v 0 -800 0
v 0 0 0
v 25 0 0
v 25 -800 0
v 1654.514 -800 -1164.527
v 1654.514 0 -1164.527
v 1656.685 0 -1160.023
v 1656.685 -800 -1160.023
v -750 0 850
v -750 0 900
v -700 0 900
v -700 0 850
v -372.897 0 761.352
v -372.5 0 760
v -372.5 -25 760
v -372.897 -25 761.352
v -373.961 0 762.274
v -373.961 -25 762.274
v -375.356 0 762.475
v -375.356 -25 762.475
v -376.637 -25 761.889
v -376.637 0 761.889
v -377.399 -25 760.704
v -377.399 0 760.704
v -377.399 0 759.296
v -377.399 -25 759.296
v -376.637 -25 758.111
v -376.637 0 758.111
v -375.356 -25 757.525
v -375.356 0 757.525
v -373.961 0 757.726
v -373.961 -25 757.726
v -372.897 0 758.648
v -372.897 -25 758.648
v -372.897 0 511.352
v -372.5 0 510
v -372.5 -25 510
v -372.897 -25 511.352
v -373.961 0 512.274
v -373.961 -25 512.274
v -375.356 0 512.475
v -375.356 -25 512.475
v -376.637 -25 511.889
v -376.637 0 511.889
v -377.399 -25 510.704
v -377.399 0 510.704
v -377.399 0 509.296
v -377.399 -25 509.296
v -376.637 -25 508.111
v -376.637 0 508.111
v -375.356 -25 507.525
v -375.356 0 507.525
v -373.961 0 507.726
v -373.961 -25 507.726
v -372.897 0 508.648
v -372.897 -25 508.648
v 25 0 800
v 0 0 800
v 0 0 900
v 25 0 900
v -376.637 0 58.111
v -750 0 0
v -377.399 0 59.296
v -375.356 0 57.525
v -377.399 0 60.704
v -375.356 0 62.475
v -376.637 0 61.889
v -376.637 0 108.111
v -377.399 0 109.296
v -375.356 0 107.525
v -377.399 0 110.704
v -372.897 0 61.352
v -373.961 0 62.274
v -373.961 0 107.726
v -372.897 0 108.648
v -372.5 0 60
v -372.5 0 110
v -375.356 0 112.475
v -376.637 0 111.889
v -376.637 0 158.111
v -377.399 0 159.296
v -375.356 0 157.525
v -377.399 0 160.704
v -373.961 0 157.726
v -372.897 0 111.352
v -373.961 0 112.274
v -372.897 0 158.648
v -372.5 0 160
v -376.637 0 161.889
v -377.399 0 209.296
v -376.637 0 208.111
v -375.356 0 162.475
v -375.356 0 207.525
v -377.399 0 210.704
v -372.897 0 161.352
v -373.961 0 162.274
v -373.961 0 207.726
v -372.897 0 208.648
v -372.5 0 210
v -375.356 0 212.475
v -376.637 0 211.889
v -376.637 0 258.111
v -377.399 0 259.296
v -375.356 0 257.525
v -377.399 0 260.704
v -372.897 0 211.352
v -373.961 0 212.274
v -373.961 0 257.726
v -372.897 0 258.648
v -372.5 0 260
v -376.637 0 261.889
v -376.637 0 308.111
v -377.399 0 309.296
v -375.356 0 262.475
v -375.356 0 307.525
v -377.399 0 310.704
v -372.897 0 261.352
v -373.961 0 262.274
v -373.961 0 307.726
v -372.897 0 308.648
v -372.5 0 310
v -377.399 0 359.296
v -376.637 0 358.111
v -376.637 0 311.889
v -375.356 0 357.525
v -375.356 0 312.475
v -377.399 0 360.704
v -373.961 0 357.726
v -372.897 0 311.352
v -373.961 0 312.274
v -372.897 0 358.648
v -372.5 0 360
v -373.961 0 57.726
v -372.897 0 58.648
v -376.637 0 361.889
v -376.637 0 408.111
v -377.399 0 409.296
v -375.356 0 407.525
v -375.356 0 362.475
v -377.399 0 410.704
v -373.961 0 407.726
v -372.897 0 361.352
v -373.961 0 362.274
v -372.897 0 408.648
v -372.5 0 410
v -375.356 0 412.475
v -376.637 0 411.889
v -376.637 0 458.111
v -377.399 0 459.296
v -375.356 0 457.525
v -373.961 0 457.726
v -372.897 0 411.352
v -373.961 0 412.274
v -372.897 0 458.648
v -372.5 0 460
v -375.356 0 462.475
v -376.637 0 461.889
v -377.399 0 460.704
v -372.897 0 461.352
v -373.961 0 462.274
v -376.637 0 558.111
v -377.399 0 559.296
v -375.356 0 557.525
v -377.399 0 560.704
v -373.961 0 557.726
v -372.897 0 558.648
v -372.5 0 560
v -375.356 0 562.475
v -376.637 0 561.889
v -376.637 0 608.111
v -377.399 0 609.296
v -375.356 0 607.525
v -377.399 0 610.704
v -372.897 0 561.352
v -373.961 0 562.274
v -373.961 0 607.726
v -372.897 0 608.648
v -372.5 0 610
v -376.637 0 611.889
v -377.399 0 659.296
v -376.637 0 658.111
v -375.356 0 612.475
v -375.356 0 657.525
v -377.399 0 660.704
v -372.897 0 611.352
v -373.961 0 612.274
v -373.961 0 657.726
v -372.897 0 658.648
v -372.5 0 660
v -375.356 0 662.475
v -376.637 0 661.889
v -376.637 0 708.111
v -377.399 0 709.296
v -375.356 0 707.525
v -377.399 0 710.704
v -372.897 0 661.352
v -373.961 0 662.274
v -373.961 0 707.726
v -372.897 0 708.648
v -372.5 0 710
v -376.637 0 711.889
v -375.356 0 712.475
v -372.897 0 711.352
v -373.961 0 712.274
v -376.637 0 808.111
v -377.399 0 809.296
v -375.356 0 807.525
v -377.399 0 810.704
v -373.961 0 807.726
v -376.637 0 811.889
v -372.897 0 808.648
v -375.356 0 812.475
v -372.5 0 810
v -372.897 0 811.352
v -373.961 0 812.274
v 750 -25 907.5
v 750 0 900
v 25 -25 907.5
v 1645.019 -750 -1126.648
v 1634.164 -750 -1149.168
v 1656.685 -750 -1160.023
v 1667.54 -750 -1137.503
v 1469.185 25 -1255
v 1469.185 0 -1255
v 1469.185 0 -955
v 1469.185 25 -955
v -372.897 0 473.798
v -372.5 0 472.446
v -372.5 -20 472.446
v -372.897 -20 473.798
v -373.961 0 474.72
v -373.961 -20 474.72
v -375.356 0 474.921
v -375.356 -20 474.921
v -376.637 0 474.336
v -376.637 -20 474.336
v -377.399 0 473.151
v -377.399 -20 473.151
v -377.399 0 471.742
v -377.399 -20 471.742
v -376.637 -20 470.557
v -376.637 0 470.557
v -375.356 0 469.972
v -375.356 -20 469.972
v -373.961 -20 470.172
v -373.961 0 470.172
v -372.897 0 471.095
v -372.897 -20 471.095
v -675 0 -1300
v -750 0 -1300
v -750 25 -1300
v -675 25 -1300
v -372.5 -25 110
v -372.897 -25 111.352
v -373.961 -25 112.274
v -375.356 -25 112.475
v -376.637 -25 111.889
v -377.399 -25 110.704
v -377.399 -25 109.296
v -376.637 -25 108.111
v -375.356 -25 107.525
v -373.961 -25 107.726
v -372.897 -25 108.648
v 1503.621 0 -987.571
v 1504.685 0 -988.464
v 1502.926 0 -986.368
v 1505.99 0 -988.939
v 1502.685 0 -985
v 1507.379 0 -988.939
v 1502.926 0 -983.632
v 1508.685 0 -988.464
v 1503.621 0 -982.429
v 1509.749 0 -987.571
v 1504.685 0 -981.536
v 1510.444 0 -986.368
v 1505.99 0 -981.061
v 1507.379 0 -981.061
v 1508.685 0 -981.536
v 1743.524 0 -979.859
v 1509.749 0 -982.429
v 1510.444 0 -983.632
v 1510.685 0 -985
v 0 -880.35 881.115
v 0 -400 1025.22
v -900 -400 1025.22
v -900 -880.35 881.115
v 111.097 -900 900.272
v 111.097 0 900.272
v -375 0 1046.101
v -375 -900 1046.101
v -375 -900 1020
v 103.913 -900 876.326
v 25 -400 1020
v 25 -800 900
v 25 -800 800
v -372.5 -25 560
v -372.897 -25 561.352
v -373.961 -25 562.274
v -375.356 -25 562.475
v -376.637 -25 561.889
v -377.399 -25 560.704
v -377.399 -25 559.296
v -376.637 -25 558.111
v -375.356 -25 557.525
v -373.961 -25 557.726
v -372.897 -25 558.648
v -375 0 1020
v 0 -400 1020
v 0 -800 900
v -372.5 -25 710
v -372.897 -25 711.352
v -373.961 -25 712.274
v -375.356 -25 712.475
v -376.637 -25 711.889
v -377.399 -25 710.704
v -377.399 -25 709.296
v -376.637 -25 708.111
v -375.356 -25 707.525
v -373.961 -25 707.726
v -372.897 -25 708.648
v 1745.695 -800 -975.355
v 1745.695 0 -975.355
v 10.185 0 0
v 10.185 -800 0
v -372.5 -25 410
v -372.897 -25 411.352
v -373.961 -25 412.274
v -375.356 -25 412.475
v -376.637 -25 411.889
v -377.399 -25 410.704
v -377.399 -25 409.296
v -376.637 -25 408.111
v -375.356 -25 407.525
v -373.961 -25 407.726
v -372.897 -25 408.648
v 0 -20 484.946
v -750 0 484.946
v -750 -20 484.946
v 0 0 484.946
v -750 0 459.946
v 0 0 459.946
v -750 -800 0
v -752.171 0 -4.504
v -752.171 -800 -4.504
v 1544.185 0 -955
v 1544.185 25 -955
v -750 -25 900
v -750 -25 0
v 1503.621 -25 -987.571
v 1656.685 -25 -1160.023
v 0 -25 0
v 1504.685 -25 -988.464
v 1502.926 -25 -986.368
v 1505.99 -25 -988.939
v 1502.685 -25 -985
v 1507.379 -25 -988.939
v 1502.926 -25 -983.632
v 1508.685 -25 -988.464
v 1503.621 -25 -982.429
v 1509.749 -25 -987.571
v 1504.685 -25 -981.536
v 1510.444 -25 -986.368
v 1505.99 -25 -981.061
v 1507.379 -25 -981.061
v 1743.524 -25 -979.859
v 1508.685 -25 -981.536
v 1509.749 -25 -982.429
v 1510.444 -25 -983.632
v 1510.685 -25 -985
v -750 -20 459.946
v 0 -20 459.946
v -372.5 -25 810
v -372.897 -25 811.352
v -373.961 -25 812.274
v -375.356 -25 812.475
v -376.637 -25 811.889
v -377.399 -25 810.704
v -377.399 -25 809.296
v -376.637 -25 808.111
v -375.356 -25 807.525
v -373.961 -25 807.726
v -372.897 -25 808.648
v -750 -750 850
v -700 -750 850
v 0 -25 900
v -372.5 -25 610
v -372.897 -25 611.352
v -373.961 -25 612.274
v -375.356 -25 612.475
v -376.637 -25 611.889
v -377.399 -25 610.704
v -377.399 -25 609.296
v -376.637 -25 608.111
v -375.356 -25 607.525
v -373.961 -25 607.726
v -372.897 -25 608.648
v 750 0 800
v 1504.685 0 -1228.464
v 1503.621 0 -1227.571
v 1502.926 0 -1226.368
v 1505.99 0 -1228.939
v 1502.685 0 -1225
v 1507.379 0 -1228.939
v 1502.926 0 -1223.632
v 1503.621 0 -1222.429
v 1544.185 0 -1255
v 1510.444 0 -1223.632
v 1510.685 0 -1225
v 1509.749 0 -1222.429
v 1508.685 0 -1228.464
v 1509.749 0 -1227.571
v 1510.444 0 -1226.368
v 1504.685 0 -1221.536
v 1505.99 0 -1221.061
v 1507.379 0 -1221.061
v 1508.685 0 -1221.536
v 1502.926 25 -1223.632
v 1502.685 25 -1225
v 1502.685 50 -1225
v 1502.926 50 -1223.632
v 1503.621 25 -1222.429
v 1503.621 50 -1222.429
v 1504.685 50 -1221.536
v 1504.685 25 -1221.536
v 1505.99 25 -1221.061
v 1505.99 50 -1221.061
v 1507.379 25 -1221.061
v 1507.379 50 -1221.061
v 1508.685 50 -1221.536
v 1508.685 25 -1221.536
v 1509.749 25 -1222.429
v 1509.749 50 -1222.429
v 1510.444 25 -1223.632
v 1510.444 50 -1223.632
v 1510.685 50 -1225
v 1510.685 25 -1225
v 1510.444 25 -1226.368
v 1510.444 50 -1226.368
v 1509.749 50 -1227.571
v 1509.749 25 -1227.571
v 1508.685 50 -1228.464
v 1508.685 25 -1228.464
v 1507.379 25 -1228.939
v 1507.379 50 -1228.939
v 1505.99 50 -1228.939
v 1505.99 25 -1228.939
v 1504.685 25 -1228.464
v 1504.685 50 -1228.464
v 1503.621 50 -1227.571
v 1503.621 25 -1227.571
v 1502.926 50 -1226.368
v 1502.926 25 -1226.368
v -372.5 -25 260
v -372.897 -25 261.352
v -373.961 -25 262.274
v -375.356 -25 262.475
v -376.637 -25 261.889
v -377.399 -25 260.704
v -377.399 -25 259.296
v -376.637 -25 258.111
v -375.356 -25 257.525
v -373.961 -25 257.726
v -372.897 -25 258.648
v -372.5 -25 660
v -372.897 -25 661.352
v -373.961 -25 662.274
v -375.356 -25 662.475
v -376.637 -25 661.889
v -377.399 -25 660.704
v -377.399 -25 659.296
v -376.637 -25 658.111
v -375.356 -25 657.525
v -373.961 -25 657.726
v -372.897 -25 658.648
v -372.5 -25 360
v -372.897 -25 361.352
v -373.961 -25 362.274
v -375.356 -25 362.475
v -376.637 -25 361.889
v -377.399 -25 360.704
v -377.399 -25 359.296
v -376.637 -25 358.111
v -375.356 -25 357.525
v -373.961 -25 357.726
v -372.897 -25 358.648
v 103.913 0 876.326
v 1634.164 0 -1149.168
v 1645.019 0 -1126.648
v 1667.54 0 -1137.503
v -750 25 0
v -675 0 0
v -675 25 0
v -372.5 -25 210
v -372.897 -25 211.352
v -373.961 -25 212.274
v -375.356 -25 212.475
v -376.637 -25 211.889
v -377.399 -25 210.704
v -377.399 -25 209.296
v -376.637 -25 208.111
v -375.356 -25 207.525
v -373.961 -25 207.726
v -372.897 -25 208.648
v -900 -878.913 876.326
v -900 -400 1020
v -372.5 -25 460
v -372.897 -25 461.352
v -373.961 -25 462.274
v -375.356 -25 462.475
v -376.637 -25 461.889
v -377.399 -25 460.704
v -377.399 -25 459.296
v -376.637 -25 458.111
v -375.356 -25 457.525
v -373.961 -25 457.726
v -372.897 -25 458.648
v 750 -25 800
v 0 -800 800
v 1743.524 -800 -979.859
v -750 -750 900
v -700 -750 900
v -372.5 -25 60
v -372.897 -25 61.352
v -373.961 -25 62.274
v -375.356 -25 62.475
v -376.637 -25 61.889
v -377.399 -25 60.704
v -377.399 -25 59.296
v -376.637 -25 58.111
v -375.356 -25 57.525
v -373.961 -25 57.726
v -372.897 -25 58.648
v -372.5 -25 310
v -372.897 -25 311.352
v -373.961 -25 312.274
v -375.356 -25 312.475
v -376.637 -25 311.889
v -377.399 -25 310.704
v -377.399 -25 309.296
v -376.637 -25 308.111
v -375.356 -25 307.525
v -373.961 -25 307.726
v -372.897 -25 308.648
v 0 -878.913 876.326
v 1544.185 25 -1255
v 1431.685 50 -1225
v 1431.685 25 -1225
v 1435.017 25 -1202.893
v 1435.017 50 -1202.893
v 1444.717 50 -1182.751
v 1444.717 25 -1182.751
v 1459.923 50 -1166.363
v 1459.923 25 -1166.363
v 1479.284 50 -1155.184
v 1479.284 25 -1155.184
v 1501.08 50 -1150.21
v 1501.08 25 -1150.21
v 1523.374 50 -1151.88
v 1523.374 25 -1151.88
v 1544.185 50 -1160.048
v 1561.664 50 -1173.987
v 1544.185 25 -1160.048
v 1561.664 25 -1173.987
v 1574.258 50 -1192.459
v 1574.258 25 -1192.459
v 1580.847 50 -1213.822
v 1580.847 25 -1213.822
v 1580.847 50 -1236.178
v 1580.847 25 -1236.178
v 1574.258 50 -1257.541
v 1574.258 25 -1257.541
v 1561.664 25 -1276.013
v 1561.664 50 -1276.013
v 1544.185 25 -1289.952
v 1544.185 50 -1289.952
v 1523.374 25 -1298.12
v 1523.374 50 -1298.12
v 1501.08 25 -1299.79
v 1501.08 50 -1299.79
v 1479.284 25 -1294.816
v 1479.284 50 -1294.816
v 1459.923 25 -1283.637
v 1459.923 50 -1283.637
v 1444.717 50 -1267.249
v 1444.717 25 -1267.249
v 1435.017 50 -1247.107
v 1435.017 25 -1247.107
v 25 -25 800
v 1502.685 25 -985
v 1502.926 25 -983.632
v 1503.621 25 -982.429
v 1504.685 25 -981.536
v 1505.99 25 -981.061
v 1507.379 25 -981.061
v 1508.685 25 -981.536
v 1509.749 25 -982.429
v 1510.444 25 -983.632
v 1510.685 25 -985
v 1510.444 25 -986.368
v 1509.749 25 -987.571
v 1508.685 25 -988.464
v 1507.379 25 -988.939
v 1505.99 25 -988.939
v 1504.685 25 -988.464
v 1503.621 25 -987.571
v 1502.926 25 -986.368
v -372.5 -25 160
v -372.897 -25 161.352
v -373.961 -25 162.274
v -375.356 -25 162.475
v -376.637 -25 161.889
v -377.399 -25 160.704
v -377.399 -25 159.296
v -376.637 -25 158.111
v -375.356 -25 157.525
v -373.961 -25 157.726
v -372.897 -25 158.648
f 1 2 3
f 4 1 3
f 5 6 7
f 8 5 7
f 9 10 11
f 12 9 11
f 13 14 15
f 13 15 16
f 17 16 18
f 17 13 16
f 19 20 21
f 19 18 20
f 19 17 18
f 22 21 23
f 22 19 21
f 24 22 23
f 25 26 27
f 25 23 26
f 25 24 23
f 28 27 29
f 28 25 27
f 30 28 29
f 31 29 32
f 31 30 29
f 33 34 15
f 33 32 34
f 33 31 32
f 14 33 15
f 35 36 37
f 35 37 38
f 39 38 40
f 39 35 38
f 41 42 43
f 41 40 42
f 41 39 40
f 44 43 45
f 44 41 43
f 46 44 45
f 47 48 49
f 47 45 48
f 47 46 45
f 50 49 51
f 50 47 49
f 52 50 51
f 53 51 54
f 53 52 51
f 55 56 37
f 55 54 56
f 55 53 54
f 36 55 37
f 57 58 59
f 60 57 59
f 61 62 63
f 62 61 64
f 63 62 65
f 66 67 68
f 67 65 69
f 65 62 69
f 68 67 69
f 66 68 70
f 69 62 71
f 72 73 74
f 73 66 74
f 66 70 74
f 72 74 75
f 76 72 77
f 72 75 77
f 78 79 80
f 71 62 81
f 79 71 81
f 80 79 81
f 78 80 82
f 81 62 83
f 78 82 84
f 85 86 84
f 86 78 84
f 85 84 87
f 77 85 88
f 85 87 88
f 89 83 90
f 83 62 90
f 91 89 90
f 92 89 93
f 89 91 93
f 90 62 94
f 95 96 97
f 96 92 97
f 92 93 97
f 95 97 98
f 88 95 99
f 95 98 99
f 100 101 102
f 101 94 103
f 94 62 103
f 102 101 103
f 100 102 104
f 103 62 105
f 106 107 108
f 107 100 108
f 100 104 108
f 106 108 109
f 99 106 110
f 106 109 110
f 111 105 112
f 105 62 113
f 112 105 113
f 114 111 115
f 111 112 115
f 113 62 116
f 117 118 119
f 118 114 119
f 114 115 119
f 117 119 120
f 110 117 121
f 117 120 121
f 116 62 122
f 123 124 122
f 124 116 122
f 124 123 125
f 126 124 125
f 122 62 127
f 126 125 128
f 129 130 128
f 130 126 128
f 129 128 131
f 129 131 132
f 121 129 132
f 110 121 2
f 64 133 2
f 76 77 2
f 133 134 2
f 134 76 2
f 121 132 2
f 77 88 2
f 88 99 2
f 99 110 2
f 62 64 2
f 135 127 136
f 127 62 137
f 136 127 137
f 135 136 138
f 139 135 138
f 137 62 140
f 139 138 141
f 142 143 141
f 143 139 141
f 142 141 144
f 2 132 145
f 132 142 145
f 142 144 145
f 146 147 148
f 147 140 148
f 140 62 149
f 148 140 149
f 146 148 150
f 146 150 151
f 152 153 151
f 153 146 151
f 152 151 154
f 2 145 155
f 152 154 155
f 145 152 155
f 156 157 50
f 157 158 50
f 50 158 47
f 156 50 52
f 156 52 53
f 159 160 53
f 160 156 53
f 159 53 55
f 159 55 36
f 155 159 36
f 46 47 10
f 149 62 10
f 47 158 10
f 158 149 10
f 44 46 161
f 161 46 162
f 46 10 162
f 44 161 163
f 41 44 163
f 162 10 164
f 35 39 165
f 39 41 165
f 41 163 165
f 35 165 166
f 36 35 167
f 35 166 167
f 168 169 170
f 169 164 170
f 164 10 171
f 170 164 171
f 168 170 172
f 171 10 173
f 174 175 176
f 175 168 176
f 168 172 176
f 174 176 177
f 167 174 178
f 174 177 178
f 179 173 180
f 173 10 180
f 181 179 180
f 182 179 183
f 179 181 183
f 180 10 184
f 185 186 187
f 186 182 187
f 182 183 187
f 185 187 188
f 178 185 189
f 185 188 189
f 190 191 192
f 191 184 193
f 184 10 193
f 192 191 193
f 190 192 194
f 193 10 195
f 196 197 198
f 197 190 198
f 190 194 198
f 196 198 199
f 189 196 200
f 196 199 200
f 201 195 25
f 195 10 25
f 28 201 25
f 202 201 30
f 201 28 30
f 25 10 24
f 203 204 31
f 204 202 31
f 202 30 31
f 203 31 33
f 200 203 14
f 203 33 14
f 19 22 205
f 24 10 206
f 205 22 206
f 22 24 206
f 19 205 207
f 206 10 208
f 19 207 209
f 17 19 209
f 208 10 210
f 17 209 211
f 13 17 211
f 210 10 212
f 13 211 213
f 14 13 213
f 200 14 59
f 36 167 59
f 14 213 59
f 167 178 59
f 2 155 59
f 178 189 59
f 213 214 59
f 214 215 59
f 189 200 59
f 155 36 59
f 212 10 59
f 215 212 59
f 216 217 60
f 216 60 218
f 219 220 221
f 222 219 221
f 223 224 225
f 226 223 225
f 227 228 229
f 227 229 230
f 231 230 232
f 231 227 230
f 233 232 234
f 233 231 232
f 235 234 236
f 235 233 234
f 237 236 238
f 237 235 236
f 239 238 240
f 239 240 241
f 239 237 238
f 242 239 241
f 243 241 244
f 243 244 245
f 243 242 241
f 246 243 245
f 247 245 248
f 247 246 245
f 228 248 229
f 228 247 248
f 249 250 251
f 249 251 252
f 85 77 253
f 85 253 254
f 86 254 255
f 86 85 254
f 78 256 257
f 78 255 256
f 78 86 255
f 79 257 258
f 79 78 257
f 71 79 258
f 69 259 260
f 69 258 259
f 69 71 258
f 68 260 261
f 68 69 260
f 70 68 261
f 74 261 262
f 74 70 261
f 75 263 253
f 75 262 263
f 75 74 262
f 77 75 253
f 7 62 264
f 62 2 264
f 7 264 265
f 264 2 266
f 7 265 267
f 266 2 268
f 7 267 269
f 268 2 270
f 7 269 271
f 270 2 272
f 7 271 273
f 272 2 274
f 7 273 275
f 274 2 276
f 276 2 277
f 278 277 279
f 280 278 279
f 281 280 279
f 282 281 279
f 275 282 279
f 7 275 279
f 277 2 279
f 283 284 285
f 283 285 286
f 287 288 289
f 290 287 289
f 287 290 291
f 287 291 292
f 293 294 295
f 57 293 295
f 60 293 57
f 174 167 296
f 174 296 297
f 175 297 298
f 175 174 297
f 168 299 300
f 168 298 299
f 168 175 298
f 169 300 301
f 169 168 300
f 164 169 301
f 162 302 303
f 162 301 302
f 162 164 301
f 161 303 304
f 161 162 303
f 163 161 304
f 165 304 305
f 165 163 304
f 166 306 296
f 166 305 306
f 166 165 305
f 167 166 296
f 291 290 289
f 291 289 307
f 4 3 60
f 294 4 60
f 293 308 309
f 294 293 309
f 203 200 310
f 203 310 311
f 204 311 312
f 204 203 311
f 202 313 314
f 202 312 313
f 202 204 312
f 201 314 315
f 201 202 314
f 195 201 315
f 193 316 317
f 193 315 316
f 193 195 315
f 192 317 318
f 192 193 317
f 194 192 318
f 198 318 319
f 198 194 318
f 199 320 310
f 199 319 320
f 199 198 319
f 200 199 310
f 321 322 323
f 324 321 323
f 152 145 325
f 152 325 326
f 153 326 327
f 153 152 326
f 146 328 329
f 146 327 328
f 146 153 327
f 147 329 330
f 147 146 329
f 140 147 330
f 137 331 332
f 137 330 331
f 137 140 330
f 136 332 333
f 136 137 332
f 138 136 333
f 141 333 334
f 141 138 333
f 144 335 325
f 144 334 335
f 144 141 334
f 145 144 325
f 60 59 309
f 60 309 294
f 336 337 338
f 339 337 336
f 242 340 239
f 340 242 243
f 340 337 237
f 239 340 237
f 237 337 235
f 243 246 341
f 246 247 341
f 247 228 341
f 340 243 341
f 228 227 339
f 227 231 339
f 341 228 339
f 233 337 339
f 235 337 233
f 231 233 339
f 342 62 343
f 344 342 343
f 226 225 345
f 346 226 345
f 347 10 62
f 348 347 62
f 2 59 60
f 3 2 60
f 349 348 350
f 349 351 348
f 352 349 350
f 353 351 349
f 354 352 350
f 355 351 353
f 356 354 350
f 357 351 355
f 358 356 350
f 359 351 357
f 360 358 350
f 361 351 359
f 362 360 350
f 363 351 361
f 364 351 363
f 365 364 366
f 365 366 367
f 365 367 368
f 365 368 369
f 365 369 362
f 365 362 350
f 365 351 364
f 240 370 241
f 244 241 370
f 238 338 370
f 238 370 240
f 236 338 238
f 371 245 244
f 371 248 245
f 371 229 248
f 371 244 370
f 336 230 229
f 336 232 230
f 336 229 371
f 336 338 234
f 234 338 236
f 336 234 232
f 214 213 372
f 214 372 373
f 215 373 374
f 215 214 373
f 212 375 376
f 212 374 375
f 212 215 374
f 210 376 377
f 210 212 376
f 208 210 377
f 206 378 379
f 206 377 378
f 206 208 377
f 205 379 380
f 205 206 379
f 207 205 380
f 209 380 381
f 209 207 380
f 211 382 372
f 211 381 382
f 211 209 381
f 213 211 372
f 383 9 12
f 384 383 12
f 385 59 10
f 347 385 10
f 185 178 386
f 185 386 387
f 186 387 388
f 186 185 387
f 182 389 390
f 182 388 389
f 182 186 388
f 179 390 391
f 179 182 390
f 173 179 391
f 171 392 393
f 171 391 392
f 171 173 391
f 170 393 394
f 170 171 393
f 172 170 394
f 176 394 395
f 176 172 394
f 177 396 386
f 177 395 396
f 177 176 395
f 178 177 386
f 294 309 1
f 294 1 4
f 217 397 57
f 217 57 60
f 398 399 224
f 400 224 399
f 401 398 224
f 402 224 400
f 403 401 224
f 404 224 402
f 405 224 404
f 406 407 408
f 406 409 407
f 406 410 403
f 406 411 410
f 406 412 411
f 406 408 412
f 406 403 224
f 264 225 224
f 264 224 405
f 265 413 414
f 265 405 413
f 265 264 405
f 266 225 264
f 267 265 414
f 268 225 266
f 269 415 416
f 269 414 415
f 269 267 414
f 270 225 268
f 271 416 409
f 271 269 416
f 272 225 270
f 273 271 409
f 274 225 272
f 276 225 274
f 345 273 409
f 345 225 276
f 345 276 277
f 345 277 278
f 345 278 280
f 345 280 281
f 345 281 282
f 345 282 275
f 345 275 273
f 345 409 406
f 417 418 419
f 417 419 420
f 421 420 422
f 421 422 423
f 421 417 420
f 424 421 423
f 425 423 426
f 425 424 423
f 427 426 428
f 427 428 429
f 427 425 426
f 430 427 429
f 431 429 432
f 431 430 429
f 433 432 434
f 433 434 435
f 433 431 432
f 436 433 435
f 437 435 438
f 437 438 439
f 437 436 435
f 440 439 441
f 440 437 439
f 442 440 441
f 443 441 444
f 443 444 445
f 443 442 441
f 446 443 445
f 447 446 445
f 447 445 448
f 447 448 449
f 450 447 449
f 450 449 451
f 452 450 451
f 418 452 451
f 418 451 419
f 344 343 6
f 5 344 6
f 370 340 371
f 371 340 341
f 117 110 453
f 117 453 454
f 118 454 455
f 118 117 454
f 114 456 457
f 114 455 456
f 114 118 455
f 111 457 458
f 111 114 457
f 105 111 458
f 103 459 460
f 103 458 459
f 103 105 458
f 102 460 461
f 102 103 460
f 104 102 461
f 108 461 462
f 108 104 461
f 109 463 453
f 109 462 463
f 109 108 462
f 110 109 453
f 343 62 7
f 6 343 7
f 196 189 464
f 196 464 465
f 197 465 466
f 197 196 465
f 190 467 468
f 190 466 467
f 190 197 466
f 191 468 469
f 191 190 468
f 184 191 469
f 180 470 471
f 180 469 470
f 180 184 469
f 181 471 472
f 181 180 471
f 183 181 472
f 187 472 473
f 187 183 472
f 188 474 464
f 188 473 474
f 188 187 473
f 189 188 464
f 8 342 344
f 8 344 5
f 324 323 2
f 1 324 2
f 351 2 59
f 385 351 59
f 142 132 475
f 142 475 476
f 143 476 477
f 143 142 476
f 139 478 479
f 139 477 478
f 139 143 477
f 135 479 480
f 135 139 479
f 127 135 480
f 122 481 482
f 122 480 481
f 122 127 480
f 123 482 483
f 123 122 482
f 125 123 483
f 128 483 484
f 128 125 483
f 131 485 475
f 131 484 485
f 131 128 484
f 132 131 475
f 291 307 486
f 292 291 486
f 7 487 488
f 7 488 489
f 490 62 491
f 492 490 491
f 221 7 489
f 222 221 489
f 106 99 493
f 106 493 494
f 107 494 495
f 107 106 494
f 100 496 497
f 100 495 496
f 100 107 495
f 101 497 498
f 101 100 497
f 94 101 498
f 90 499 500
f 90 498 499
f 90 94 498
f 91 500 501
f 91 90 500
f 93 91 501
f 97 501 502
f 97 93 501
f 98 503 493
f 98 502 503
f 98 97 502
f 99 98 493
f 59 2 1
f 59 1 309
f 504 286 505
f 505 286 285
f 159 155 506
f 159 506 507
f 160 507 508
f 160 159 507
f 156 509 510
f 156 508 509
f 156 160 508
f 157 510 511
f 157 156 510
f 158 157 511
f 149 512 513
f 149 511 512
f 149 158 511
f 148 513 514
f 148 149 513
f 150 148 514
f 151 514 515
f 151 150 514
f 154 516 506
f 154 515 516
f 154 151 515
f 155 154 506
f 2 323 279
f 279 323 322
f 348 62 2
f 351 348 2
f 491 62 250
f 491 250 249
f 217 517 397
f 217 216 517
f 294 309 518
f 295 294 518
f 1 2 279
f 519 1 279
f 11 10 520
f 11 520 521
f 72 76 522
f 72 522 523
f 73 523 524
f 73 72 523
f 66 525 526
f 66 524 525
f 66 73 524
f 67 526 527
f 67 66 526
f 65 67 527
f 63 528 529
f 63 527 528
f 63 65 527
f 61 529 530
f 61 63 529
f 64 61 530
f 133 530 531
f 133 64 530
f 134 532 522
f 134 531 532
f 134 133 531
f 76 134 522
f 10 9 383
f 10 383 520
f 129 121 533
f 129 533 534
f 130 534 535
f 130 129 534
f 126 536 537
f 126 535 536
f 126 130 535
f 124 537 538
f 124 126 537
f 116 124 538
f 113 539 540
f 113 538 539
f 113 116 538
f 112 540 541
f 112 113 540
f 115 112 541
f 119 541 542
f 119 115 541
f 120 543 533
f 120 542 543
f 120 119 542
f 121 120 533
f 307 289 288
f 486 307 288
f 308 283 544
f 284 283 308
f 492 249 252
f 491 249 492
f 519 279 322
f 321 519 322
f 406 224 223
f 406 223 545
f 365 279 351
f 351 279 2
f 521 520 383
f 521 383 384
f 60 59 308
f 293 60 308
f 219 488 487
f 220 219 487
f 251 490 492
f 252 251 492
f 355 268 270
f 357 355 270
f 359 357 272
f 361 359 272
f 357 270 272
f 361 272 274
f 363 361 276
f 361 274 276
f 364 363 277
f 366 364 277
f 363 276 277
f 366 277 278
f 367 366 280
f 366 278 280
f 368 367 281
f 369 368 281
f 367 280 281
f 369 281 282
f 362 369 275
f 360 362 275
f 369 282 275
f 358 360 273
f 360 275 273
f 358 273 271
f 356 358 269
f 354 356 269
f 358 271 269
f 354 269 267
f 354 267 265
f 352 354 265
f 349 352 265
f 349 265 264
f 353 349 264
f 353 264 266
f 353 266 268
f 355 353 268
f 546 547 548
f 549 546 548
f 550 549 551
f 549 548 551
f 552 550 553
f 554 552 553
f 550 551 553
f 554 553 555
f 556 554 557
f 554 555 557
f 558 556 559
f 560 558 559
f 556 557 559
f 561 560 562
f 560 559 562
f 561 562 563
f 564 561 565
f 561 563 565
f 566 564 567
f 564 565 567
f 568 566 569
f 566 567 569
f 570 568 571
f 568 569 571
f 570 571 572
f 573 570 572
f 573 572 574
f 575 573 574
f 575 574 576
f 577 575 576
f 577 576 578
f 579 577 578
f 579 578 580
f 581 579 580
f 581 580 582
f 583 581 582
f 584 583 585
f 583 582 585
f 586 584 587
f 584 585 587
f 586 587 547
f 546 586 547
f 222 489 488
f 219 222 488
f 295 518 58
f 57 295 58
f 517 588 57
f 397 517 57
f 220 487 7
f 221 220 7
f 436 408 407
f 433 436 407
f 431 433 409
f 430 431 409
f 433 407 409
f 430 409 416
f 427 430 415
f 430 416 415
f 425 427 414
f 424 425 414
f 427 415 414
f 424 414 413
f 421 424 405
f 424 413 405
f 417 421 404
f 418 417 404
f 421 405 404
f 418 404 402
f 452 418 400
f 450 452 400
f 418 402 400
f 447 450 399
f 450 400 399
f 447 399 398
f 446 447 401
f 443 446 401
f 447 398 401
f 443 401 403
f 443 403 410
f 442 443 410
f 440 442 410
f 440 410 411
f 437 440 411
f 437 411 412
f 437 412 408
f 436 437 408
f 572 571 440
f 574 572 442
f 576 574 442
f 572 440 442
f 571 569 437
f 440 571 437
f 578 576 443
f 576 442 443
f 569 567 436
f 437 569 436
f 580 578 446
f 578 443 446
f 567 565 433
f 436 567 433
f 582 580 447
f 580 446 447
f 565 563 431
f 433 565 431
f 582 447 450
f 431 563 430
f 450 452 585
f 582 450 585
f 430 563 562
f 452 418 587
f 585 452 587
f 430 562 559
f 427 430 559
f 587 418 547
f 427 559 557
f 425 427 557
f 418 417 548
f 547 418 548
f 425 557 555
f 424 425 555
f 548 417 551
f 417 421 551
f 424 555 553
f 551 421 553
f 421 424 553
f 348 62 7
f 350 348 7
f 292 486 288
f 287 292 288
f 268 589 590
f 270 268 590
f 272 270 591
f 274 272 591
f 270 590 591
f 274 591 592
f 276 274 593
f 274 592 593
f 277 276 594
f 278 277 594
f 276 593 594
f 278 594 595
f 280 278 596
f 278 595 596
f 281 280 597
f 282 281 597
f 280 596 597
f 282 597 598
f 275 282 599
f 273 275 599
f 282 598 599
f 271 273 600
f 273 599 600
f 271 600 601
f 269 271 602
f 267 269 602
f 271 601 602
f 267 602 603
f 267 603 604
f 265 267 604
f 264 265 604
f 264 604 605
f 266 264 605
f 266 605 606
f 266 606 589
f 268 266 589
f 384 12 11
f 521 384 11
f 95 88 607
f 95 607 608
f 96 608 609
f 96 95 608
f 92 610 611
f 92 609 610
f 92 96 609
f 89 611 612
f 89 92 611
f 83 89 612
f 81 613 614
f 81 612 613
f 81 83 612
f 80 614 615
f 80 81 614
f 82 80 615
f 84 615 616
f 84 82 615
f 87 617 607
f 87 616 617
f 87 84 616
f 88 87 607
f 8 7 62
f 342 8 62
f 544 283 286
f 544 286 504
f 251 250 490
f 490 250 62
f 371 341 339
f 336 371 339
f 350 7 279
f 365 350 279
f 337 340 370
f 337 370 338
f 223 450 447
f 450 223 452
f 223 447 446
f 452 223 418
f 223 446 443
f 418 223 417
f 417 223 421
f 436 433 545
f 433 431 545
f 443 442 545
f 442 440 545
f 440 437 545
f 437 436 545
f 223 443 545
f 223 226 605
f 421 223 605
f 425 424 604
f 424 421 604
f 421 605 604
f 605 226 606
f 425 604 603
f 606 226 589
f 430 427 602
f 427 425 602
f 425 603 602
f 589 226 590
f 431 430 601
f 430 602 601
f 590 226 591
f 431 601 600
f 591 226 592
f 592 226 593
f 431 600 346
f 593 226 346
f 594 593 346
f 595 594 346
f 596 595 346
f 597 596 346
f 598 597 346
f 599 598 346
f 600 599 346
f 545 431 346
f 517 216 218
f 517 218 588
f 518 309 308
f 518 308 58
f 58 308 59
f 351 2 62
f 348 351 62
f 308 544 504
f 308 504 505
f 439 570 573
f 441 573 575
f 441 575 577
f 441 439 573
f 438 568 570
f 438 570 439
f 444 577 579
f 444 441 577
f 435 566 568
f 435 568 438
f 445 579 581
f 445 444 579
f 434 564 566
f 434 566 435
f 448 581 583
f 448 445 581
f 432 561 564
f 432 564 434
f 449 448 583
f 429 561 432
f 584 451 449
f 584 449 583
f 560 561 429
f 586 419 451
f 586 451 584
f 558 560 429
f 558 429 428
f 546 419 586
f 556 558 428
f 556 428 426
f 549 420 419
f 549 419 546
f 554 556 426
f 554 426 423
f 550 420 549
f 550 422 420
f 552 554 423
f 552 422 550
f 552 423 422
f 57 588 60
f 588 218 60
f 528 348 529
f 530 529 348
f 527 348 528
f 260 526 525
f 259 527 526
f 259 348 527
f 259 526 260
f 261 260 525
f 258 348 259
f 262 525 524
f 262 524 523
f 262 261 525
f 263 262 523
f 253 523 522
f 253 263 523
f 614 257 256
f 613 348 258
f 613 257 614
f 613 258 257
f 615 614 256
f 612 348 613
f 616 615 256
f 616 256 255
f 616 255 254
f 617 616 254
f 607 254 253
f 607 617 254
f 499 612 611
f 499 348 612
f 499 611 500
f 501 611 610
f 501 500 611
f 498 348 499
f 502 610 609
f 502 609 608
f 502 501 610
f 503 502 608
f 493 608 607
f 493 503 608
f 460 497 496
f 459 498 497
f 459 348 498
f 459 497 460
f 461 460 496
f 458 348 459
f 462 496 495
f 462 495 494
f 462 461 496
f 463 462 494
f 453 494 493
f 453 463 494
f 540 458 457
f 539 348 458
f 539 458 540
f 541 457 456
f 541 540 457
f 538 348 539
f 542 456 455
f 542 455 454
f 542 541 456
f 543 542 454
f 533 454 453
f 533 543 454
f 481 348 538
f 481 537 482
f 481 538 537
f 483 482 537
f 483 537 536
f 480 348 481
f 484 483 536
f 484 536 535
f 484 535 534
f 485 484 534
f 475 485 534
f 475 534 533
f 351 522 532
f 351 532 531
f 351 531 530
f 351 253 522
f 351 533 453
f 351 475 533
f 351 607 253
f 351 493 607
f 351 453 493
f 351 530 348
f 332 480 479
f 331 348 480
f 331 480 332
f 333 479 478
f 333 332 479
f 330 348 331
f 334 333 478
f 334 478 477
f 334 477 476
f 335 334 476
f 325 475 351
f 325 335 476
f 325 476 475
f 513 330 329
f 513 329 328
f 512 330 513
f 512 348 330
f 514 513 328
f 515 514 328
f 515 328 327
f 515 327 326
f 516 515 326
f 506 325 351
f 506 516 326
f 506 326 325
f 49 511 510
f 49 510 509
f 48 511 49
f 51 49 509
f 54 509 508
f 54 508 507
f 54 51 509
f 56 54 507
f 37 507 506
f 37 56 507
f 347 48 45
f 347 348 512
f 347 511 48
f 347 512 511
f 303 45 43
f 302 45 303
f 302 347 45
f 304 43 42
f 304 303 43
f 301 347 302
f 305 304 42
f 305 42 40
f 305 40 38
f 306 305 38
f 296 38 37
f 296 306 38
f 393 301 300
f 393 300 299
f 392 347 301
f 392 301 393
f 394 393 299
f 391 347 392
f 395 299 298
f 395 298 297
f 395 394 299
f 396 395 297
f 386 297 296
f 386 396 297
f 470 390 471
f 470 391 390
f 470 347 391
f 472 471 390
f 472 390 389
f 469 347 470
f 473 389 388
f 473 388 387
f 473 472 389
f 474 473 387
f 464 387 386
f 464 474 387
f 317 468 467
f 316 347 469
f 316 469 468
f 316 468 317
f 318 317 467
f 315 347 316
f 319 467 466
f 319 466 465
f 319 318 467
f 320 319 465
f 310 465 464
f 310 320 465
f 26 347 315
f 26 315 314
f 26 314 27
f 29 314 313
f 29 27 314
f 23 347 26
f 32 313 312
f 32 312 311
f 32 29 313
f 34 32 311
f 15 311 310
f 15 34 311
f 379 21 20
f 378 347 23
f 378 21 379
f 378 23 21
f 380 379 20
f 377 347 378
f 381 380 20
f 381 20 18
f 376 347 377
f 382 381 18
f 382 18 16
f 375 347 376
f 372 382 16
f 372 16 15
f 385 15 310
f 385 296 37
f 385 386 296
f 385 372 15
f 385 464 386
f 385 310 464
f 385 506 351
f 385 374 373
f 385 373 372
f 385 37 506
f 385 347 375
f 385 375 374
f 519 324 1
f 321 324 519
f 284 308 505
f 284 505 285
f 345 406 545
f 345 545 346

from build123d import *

# Parameters (mm, degrees)
F1_DEPTH  = 25
F2_DEPTH  = 25
F3_W      = 50
F3_H      = 50
F4_DEPTH  = 750
F5_W      = 25
F5_H      = 900
F6_DEPTH  = 800
F8_DEPTH  = 800
F9_W      = 750
F9_H      = 25
F9_R      = 2.5
F10_DEPTH = 20
F12_DEPTH = 900
F14_DEPTH = 800
F16_DEPTH = 900
F17_DEPTH = 25
F19_DEPTH = 725
F21_W     = 75
F21_H     = 1300
F22_DEPTH = 25
F23_W     = 75
F23_H     = 300
F23_R     = 4
F24_DEPTH = 25
F25_R     = 75
F25_R_2   = 4
F26_DEPTH = 25
F27_R     = 4
F28_DEPTH = 925.001
F29_R     = 2.5
F30_DEPTH = 900.001


with BuildPart() as f1:
    # F0 (on Front) → F1 (new body)
    with BuildSketch(Plane.XZ):
        Polygon((-750, 0), (1656.6848435524, -1160.0232158931), (1743.5238650638, -979.8594449986), (0, 0), align=None)
    extrude(amount=F1_DEPTH)


with BuildPart() as f2:
    # F0 (on Front) → F2 (new body)
    with BuildSketch(Plane.XZ):
        Polygon((-750, 900), (-750, 0), (0, 0), (0, 200), (0, 900), align=None)
    extrude(amount=F2_DEPTH)

    # F29 (on face) → F30 (cut, through all)
    with BuildSketch(Plane.XZ):
        with Locations((-375, 60)):
            Circle(F29_R)
        with Locations((-375, 110)):
            Circle(F29_R)
        with Locations((-375, 160)):
            Circle(F29_R)
        with Locations((-375, 210)):
            Circle(F29_R)
        with Locations((-375, 260)):
            Circle(F29_R)
        with Locations((-375, 310)):
            Circle(F29_R)
        with Locations((-375, 360)):
            Circle(F29_R)
        with Locations((-375, 410)):
            Circle(F29_R)
        with Locations((-375, 460)):
            Circle(F29_R)
        with Locations((-375, 510)):
            Circle(F29_R)
        with Locations((-375, 560)):
            Circle(F29_R)
        with Locations((-375, 610)):
            Circle(F29_R)
        with Locations((-375, 660)):
            Circle(F29_R)
        with Locations((-375, 710)):
            Circle(F29_R)
        with Locations((-375, 760)):
            Circle(F29_R)
        with Locations((-375, 810)):
            Circle(F29_R)
    extrude(amount=F30_DEPTH, mode=Mode.SUBTRACT)


with BuildPart() as f4:
    # F3 (on Front) → F4 (new body)
    with BuildSketch(Plane.XZ):
        with Locations((-725, 875)):
            Rectangle(F3_W, F3_H)
    extrude(amount=F4_DEPTH)


with BuildPart() as f4b:
    # F3 (on Front) → F4, piece 2 (new body)
    with BuildSketch(Plane.XZ):
        Polygon((1656.6848435524, -1160.0232158931), (1667.5397212413, -1137.5027445313), (1645.0192498795, -1126.6478668424), (1634.1643721905, -1149.1683382042), align=None)
    extrude(amount=F4_DEPTH)


with BuildPart() as f6:
    # F5 (on Front) → F6 (new body)
    with BuildSketch(Plane.XZ):
        with Locations((12.5, 450)):
            Rectangle(F5_W, F5_H)
    extrude(amount=F6_DEPTH)


with BuildPart() as f8:
    # F7 (on Front) → F8 (new body)
    with BuildSketch(Plane.XZ):
        Polygon((1656.6848435524, -1160.0232158931), (-750, 0), (-752.1709755378, -4.5040942724), (1654.5138680146, -1164.5273101655), align=None)
    extrude(amount=F8_DEPTH)


with BuildPart() as f10:
    # F9 (on Front) → F10 (new body)
    with BuildSketch(Plane.XZ):
        with Locations((-375, 472.4463045597)):
            Rectangle(F9_W, F9_H)
        with Locations((-375, 472.4463045597)):
            Circle(F9_R, mode=Mode.SUBTRACT)
    extrude(amount=F10_DEPTH)


with BuildPart() as f12:
    # F11 (on Front) → F12 (new body)
    with BuildSketch(Plane.XZ):
        Polygon((-375, 1046.1007662723), (-375, 1020), (103.9131426106, 876.3260572168), (111.0968397497, 900.2717143474), align=None)
    extrude(amount=F12_DEPTH)


with BuildPart() as f14:
    # F13 (on Front) → F14 (new body)
    with BuildSketch(Plane.XZ):
        Polygon((0, 0), (1743.5238650638, -979.8594449986), (1745.6948406016, -975.3553507262), (10.1853860682, 0), align=None)
    extrude(amount=F14_DEPTH)


with BuildPart() as f16:
    # F15 (on Right) → F16 (new body)
    with BuildSketch(Plane.YZ):
        Polygon((-800, 900), (-400, 1020), (-400, 1025.2201532545), (-880.3498820384, 881.1151886429), (-878.9131426106, 876.3260572168), align=None)
    extrude(amount=-F16_DEPTH)


with BuildPart() as f17:
    # F15 (on Right) → F17 (new body)
    with BuildSketch(Plane.YZ):
        Polygon((0, 900), (-400, 1020), (-800, 900), (-800, 800), (0, 800), align=None)
    extrude(amount=F17_DEPTH)


with BuildPart() as f19:
    # F18 (on face) → F19 (new body)
    with BuildSketch(Plane.YZ.offset(25)):
        Polygon((-25, 800), (0, 800), (0, 900), (-25, 907.5), align=None)
    extrude(amount=F19_DEPTH)


with BuildPart() as f22:
    # F21 (on Front) → F22 (new body)
    with BuildSketch(Plane.XZ):
        with Locations((-712.5, -650)):
            Rectangle(F21_W, F21_H)
    extrude(amount=-F22_DEPTH)


with BuildPart() as f24:
    # F23 (on Front) → F24 (new body)
    with BuildSketch(Plane.XZ):
        with Locations((1506.6848435524, -1105)):
            Rectangle(F23_W, F23_H)
        with Locations((1506.6848435524, -1225)):
            Circle(F23_R, mode=Mode.SUBTRACT)
    extrude(amount=-F24_DEPTH)


with BuildPart() as f26:
    # F25 (on face) → F26 (new body)
    with BuildSketch(Plane(origin=(0, 25, 0), x_dir=(-1, 0, 0), z_dir=(0, 1, 0))):
        with Locations((-1506.6848435524, -1225)):
            Circle(F25_R)
        with Locations((-1506.6848435524, -1225)):
            Circle(F25_R_2, mode=Mode.SUBTRACT)
    extrude(amount=F26_DEPTH)


with BuildPart() as f28_tool:
    # F27 (on face) → F28 (new body, through all)
    with BuildSketch(Plane(origin=(0, 25, 0), x_dir=(-1, 0, 0), z_dir=(0, 1, 0))):
        with Locations((-1506.6848435524, -985)):
            Circle(F27_R)
    extrude(amount=-F28_DEPTH)


with BuildPart() as f1_1:
    add(f1.part)

    # F28: cut by f28_tool
    add(f28_tool.part, mode=Mode.SUBTRACT)


with BuildPart() as f24_1:
    add(f24.part)

    # F28: cut by f28_tool
    add(f28_tool.part, mode=Mode.SUBTRACT)


solid = Compound([f2.part, f4.part, f4b.part, f6.part, f8.part, f10.part, f12.part, f14.part, f16.part, f17.part, f19.part, f22.part, f26.part, f1_1.part, f24_1.part])
